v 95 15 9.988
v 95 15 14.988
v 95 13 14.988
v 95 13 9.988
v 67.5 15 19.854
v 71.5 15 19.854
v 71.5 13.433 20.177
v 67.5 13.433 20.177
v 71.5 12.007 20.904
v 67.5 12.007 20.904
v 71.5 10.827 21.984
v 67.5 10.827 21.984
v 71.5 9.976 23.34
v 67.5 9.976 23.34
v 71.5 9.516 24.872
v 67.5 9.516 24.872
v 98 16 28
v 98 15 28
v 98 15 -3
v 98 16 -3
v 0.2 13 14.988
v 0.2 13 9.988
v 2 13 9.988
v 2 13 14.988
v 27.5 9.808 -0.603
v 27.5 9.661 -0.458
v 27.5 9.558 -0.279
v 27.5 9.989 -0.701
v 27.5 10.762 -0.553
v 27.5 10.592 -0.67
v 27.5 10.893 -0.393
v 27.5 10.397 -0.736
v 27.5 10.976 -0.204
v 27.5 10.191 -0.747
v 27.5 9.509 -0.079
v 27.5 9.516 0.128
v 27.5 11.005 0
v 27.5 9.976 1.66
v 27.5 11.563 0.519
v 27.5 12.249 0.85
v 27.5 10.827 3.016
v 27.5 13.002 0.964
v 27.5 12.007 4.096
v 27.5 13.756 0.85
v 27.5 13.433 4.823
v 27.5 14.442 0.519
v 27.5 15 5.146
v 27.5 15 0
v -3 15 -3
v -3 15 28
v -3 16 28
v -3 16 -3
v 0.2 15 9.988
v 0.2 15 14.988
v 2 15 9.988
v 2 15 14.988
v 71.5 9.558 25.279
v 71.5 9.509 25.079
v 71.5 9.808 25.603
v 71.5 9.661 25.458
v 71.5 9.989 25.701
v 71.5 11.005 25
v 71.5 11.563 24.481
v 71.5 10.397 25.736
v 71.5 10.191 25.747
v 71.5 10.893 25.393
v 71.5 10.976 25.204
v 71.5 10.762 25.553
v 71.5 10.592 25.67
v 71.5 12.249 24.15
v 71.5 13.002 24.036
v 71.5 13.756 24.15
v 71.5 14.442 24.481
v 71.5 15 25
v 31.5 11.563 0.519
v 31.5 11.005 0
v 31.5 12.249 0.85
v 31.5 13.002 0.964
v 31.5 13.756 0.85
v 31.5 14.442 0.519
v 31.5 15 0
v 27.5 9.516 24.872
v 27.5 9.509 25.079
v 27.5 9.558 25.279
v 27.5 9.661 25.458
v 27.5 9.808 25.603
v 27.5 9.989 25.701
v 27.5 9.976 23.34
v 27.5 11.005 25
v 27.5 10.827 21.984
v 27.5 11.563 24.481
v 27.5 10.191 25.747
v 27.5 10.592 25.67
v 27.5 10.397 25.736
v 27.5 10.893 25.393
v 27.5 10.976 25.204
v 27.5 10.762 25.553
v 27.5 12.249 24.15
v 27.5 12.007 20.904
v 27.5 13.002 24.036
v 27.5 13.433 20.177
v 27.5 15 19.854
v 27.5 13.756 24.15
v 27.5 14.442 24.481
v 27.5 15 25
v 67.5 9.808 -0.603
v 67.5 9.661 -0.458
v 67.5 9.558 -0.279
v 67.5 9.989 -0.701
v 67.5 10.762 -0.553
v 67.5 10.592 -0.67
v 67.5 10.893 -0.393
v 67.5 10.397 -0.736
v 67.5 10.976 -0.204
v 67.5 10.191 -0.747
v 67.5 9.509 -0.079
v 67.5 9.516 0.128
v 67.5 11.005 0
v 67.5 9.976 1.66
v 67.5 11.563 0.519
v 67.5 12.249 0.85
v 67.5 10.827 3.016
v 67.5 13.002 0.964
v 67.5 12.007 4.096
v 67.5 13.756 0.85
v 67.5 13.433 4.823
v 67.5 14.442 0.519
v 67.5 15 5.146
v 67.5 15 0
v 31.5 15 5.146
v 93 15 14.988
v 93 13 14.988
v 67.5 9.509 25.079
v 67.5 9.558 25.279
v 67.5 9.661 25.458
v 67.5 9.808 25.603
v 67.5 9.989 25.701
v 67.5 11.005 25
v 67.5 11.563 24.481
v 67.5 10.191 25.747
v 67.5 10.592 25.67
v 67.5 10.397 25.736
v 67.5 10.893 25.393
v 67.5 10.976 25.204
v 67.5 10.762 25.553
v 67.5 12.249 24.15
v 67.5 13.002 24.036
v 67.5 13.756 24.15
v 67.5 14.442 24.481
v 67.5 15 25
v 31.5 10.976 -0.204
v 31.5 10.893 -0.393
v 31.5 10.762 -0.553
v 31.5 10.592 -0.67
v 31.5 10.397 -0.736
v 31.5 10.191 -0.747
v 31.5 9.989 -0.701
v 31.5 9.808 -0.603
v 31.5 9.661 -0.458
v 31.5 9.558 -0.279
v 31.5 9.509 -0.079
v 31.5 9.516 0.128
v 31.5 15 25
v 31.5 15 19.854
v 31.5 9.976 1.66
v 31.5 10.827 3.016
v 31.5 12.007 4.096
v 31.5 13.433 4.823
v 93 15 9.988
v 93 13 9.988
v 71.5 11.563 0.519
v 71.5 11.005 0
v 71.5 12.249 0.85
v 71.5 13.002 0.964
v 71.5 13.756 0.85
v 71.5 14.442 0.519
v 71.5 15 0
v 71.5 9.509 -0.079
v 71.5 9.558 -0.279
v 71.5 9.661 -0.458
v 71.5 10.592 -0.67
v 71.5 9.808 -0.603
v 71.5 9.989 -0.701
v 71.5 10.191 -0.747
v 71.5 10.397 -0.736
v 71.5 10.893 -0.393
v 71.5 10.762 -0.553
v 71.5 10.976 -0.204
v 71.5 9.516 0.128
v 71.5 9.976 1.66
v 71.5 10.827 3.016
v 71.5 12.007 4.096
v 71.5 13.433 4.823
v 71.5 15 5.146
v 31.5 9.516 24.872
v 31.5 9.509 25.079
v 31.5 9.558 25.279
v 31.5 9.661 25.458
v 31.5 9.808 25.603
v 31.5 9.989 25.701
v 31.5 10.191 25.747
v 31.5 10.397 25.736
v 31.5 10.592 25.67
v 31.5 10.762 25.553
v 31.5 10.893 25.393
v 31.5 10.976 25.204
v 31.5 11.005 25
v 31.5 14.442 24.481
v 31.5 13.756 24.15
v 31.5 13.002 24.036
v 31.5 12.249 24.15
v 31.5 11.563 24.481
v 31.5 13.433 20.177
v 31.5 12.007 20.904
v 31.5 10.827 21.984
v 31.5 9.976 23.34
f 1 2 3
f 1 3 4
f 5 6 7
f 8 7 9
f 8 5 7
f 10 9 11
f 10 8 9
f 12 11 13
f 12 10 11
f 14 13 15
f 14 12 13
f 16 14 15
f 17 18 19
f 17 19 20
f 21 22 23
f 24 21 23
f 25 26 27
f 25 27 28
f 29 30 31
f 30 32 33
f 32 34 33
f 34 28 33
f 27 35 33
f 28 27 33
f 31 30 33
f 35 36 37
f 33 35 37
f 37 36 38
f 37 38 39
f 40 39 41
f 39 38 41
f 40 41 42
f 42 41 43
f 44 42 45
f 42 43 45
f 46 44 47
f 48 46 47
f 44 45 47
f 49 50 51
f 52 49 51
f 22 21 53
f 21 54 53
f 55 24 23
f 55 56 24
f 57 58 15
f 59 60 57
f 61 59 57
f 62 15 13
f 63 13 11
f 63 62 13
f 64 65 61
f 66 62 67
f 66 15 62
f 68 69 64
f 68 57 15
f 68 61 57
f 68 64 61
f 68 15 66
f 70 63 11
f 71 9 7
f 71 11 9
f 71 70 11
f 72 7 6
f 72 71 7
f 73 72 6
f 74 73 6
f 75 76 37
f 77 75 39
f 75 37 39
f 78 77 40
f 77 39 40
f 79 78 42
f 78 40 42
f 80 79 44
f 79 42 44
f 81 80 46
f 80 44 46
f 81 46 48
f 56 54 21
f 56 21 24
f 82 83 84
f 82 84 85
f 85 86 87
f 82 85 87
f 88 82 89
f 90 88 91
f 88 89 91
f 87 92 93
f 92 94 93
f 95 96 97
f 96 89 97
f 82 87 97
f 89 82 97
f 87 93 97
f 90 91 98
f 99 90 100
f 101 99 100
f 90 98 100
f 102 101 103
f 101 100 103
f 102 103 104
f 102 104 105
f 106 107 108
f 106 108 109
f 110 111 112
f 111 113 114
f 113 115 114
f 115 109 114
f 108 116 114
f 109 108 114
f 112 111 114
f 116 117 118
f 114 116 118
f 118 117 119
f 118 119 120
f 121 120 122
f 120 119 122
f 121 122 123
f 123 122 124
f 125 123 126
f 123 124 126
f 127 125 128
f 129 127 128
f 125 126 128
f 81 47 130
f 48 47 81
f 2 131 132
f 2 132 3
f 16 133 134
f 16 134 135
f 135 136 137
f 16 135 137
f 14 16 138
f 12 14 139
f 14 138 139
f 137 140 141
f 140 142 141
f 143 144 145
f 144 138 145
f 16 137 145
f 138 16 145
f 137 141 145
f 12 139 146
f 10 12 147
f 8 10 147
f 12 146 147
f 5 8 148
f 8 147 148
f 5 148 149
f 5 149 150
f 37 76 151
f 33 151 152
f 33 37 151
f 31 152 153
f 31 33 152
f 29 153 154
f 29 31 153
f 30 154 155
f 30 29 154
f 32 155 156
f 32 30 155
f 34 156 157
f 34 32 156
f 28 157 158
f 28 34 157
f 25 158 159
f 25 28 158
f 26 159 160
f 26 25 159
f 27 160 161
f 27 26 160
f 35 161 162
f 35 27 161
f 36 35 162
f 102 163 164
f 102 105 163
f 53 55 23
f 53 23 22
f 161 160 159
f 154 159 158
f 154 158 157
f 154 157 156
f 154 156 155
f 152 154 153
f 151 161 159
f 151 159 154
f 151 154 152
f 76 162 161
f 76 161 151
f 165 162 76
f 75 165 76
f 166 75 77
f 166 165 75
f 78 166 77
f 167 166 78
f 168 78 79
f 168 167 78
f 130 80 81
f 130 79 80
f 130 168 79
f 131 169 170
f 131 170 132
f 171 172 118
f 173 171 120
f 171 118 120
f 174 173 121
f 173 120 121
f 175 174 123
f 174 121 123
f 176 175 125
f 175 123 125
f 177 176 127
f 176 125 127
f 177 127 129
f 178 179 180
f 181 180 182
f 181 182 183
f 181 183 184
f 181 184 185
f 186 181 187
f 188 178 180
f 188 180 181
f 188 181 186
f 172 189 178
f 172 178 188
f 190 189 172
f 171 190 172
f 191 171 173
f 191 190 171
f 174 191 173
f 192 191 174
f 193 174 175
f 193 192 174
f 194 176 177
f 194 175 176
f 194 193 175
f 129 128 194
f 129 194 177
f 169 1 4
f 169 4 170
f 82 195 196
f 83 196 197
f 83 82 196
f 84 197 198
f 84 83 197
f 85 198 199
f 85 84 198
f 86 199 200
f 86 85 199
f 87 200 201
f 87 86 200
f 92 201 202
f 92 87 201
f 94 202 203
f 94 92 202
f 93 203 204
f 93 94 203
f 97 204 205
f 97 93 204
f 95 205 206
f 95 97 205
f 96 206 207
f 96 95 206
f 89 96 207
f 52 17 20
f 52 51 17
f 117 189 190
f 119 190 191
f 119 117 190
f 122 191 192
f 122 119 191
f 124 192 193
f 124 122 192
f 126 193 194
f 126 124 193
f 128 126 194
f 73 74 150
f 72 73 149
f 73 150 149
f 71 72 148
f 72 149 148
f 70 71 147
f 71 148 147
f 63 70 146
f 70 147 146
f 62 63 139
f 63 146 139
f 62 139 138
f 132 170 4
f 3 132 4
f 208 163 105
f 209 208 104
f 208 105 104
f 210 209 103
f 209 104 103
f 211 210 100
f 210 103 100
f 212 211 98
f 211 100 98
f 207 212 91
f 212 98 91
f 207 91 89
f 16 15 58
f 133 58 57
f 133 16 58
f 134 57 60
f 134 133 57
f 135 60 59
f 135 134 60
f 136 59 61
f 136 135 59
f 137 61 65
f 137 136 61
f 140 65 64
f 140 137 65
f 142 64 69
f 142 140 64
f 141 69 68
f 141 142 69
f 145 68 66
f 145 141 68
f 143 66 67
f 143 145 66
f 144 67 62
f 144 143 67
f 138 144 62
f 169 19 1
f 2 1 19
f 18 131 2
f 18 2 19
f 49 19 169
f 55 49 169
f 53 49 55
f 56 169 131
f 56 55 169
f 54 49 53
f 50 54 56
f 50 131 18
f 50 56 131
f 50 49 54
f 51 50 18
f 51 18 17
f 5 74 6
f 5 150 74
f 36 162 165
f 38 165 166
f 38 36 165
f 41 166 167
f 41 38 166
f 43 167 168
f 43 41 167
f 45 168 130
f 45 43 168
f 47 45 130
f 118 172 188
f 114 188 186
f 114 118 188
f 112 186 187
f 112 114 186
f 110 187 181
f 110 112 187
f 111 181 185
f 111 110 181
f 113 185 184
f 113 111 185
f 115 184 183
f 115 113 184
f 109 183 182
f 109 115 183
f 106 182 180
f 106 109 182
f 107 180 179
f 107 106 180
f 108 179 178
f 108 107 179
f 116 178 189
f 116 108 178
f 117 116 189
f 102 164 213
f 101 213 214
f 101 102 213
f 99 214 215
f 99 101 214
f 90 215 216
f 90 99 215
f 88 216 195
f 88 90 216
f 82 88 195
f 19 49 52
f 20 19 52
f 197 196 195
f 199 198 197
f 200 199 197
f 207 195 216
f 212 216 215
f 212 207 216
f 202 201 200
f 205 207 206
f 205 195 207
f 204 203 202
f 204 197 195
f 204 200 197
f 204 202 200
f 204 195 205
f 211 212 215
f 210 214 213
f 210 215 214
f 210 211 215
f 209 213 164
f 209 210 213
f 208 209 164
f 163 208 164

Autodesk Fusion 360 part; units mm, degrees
sketch "Sketch1" plane through (0, 0, 0) normal (0, 1, 0) x (1, 0, 0)
  line L0 (0, 0) -> (95, 0)
  line L1 (95, 0) -> (95, -25)
  line L2 (95, -25) -> (0, -25)
  line L3 (0, -25) -> (0, 0)
  line L4 (98, 3) -> (98, -28)
  line L5 (98, -28) -> (-3, -28)
  line L6 (-3, -28) -> (-3, 3)
  line L7 (-3, 3) -> (98, 3)
  dimension "d1" = 95
  dimension "d2" = 25
  dimension "d3" = -3
extrude "Extrude1" add sketch "Sketch1" along normal blind 15 makes body 1
extrude "Extrude2" add sketch "Sketch1" along normal blind 3 contours L0 L1 L2 L3 bodies 1
ref_plane "WorkPlane1" through (47.5, 7.5, 12.5) normal (0, 0, 1) x (1, 0, 0)
ref_plane "WorkPlane2" through (47.5, 7.5, 12.5) normal (1, 0, 0) x (0, 0, -1)
sketch "Sketch3" plane through (47.5, 0, 0) normal (1, 0, 0) x (0, 1, 0)
  line L0 (15, 28) -> (0, 28)
  line L1 (0, 28) -> (0, -3)
  line L2 (0, -3) -> (15, -3)
  line L3 (15, -3) -> (15, 0)
  line L4 (15, 0) -> (3, 0)
  line L5 (3, 0) -> (3, 25)
  line L6 (3, 25) -> (15, 25)
  line L7 (15, 25) -> (15, 28)
  circle A0 centre (10.2546, 25) radius 0.75
  circle A1 centre (10.2546, 25) radius 0.85
  arc A2 (9.5155, 24.8723) -> (15, 19.8539) centre (15.4085, 25.8065) ccw
  arc A3 (11.0046, 25) -> (15, 25) centre (13.0023, 26.5886) ccw
  line L8 (20.7, 12.5) -> (-5.7, 12.5)
  line L9 (15, 28) -> (15, -3)
  line L10 (15, 28) -> (16, 28)
  line L11 (16, 28) -> (16, -3)
  line L12 (15, -3) -> (16, -3)
  arc A4 (15, 0) -> (11.0046, 0) centre (13.0023, -1.5886) ccw
  arc A5 (15, 5.1461) -> (9.5155, 0.1277) centre (15.4085, -0.8065) ccw
  circle A6 centre (10.2546, 0) radius 0.75
  circle A7 centre (10.2546, 0) radius 0.85
  dimension "d8" = 1.5
extrude "Extrude9" cut sketch "Sketch3" along normal mid plane 95 contours L6 A1 A3 | L6 A0 A1 | A0 A1 A2 A3 | L6 A0 | L6 A0 | L6 A0 A1 A2 | L4 A5 A6 A7 | L4 A6 A7 | A4 A5 A6 A7 | L4 A4 A7 | L4 A6 | L4 A6 picked at (11.048, 24.9876) picked at (11.048, 0.0124) bodies 1
extrude "Extrude10" add sketch "Sketch3" along normal blind 4 from surface at 20 separate body contours A1 A2 A3 L9 | A0 A1 A2 A3 | L6 A0 | L6 A0 | L9 A4 A5 A7 | A4 A5 A6 A7 | L4 A6 | L4 A6 makes body 2 at (68.8333, 9.9277, 23.4484) makes body 3 at (68.8333, 11.2723, 3.4937)
extrude "Extrude11" add sketch "Sketch3" along normal blind 4 from surface at -20 separate body contours A1 A2 A3 L9 | A0 A1 A2 A3 | L6 A0 | L6 A0 | L9 A4 A5 A7 | A4 A5 A6 A7 | L4 A6 | L4 A6 makes body 4 at (28.8333, 11.2723, 3.4937) makes body 5 at (28.8333, 9.9277, 23.4484)
extrude "Extrude12" add sketch "Sketch3" along normal mid plane 101 separate body contours L7 L8 L9 L10 L11 | L3 L8 L9 L11 L12 makes body 6
sketch "Sketch6" plane through (0, 15, 0) normal (0, 1, 0) x (1, 0, 0)
  line L0 (-3, -25) -> (-3, -28)
  line L1 (98, -28) -> (98, -25)
  line L2 (95, -25) -> (0, -25)
  line L3 (0, -25) -> (0, 0)
  line L4 (0, 0) -> (95, 0)
  line L5 (95, -25) -> (95, 0)
  line L6 (0, -14.9882) -> (2, -14.9882)
  line L7 (2, -14.9882) -> (2, -9.9882)
  line L8 (2, -9.9882) -> (0, -9.9882)
  line L9 (0, -14.9882) -> (0, -9.9882)
  line L10 (0, -14.9882) -> (0, -9.9882)
  line L11 (95, -9.9882) -> (93, -9.9882)
  line L12 (93, -9.9882) -> (93, -14.9882)
  line L13 (93, -14.9882) -> (95, -14.9882)
  line L14 (95, -9.9882) -> (95, -14.9882)
  line L15 (98, -25) -> (71.5, -25)
  line L16 (-3, -28) -> (98, -28)
  line L17 (71.5, -25) -> (67.5, -25)
  line L18 (67.5, -25) -> (31.5, -25)
  line L19 (31.5, -25) -> (27.5, -25)
  line L20 (27.5, -25) -> (-3, -25)
extrude "Extrude8" add sketch "Sketch6" against normal blind 2 contours L3 L6 L7 L8 L9 L10 | L5 L11 L12 L13 L14 bodies 6
sketch "Sketch7" plane through (0, 0, 0) normal (-1, 0, 0) x (0, -1, 0)
  line L0 (-13, 14.9882) -> (-15, 14.9882)
  line L1 (-13, 9.9882) -> (-13, 14.9882)
  line L2 (-15, 9.9882) -> (-13, 9.9882)
  line L3 (-15, 14.9882) -> (-15, 9.9882)
move_face "OffsetFaces1" offset -0.2 1 faces at (0, 14.3333, 13.3216) on bodies 6
hidden bodies 1
